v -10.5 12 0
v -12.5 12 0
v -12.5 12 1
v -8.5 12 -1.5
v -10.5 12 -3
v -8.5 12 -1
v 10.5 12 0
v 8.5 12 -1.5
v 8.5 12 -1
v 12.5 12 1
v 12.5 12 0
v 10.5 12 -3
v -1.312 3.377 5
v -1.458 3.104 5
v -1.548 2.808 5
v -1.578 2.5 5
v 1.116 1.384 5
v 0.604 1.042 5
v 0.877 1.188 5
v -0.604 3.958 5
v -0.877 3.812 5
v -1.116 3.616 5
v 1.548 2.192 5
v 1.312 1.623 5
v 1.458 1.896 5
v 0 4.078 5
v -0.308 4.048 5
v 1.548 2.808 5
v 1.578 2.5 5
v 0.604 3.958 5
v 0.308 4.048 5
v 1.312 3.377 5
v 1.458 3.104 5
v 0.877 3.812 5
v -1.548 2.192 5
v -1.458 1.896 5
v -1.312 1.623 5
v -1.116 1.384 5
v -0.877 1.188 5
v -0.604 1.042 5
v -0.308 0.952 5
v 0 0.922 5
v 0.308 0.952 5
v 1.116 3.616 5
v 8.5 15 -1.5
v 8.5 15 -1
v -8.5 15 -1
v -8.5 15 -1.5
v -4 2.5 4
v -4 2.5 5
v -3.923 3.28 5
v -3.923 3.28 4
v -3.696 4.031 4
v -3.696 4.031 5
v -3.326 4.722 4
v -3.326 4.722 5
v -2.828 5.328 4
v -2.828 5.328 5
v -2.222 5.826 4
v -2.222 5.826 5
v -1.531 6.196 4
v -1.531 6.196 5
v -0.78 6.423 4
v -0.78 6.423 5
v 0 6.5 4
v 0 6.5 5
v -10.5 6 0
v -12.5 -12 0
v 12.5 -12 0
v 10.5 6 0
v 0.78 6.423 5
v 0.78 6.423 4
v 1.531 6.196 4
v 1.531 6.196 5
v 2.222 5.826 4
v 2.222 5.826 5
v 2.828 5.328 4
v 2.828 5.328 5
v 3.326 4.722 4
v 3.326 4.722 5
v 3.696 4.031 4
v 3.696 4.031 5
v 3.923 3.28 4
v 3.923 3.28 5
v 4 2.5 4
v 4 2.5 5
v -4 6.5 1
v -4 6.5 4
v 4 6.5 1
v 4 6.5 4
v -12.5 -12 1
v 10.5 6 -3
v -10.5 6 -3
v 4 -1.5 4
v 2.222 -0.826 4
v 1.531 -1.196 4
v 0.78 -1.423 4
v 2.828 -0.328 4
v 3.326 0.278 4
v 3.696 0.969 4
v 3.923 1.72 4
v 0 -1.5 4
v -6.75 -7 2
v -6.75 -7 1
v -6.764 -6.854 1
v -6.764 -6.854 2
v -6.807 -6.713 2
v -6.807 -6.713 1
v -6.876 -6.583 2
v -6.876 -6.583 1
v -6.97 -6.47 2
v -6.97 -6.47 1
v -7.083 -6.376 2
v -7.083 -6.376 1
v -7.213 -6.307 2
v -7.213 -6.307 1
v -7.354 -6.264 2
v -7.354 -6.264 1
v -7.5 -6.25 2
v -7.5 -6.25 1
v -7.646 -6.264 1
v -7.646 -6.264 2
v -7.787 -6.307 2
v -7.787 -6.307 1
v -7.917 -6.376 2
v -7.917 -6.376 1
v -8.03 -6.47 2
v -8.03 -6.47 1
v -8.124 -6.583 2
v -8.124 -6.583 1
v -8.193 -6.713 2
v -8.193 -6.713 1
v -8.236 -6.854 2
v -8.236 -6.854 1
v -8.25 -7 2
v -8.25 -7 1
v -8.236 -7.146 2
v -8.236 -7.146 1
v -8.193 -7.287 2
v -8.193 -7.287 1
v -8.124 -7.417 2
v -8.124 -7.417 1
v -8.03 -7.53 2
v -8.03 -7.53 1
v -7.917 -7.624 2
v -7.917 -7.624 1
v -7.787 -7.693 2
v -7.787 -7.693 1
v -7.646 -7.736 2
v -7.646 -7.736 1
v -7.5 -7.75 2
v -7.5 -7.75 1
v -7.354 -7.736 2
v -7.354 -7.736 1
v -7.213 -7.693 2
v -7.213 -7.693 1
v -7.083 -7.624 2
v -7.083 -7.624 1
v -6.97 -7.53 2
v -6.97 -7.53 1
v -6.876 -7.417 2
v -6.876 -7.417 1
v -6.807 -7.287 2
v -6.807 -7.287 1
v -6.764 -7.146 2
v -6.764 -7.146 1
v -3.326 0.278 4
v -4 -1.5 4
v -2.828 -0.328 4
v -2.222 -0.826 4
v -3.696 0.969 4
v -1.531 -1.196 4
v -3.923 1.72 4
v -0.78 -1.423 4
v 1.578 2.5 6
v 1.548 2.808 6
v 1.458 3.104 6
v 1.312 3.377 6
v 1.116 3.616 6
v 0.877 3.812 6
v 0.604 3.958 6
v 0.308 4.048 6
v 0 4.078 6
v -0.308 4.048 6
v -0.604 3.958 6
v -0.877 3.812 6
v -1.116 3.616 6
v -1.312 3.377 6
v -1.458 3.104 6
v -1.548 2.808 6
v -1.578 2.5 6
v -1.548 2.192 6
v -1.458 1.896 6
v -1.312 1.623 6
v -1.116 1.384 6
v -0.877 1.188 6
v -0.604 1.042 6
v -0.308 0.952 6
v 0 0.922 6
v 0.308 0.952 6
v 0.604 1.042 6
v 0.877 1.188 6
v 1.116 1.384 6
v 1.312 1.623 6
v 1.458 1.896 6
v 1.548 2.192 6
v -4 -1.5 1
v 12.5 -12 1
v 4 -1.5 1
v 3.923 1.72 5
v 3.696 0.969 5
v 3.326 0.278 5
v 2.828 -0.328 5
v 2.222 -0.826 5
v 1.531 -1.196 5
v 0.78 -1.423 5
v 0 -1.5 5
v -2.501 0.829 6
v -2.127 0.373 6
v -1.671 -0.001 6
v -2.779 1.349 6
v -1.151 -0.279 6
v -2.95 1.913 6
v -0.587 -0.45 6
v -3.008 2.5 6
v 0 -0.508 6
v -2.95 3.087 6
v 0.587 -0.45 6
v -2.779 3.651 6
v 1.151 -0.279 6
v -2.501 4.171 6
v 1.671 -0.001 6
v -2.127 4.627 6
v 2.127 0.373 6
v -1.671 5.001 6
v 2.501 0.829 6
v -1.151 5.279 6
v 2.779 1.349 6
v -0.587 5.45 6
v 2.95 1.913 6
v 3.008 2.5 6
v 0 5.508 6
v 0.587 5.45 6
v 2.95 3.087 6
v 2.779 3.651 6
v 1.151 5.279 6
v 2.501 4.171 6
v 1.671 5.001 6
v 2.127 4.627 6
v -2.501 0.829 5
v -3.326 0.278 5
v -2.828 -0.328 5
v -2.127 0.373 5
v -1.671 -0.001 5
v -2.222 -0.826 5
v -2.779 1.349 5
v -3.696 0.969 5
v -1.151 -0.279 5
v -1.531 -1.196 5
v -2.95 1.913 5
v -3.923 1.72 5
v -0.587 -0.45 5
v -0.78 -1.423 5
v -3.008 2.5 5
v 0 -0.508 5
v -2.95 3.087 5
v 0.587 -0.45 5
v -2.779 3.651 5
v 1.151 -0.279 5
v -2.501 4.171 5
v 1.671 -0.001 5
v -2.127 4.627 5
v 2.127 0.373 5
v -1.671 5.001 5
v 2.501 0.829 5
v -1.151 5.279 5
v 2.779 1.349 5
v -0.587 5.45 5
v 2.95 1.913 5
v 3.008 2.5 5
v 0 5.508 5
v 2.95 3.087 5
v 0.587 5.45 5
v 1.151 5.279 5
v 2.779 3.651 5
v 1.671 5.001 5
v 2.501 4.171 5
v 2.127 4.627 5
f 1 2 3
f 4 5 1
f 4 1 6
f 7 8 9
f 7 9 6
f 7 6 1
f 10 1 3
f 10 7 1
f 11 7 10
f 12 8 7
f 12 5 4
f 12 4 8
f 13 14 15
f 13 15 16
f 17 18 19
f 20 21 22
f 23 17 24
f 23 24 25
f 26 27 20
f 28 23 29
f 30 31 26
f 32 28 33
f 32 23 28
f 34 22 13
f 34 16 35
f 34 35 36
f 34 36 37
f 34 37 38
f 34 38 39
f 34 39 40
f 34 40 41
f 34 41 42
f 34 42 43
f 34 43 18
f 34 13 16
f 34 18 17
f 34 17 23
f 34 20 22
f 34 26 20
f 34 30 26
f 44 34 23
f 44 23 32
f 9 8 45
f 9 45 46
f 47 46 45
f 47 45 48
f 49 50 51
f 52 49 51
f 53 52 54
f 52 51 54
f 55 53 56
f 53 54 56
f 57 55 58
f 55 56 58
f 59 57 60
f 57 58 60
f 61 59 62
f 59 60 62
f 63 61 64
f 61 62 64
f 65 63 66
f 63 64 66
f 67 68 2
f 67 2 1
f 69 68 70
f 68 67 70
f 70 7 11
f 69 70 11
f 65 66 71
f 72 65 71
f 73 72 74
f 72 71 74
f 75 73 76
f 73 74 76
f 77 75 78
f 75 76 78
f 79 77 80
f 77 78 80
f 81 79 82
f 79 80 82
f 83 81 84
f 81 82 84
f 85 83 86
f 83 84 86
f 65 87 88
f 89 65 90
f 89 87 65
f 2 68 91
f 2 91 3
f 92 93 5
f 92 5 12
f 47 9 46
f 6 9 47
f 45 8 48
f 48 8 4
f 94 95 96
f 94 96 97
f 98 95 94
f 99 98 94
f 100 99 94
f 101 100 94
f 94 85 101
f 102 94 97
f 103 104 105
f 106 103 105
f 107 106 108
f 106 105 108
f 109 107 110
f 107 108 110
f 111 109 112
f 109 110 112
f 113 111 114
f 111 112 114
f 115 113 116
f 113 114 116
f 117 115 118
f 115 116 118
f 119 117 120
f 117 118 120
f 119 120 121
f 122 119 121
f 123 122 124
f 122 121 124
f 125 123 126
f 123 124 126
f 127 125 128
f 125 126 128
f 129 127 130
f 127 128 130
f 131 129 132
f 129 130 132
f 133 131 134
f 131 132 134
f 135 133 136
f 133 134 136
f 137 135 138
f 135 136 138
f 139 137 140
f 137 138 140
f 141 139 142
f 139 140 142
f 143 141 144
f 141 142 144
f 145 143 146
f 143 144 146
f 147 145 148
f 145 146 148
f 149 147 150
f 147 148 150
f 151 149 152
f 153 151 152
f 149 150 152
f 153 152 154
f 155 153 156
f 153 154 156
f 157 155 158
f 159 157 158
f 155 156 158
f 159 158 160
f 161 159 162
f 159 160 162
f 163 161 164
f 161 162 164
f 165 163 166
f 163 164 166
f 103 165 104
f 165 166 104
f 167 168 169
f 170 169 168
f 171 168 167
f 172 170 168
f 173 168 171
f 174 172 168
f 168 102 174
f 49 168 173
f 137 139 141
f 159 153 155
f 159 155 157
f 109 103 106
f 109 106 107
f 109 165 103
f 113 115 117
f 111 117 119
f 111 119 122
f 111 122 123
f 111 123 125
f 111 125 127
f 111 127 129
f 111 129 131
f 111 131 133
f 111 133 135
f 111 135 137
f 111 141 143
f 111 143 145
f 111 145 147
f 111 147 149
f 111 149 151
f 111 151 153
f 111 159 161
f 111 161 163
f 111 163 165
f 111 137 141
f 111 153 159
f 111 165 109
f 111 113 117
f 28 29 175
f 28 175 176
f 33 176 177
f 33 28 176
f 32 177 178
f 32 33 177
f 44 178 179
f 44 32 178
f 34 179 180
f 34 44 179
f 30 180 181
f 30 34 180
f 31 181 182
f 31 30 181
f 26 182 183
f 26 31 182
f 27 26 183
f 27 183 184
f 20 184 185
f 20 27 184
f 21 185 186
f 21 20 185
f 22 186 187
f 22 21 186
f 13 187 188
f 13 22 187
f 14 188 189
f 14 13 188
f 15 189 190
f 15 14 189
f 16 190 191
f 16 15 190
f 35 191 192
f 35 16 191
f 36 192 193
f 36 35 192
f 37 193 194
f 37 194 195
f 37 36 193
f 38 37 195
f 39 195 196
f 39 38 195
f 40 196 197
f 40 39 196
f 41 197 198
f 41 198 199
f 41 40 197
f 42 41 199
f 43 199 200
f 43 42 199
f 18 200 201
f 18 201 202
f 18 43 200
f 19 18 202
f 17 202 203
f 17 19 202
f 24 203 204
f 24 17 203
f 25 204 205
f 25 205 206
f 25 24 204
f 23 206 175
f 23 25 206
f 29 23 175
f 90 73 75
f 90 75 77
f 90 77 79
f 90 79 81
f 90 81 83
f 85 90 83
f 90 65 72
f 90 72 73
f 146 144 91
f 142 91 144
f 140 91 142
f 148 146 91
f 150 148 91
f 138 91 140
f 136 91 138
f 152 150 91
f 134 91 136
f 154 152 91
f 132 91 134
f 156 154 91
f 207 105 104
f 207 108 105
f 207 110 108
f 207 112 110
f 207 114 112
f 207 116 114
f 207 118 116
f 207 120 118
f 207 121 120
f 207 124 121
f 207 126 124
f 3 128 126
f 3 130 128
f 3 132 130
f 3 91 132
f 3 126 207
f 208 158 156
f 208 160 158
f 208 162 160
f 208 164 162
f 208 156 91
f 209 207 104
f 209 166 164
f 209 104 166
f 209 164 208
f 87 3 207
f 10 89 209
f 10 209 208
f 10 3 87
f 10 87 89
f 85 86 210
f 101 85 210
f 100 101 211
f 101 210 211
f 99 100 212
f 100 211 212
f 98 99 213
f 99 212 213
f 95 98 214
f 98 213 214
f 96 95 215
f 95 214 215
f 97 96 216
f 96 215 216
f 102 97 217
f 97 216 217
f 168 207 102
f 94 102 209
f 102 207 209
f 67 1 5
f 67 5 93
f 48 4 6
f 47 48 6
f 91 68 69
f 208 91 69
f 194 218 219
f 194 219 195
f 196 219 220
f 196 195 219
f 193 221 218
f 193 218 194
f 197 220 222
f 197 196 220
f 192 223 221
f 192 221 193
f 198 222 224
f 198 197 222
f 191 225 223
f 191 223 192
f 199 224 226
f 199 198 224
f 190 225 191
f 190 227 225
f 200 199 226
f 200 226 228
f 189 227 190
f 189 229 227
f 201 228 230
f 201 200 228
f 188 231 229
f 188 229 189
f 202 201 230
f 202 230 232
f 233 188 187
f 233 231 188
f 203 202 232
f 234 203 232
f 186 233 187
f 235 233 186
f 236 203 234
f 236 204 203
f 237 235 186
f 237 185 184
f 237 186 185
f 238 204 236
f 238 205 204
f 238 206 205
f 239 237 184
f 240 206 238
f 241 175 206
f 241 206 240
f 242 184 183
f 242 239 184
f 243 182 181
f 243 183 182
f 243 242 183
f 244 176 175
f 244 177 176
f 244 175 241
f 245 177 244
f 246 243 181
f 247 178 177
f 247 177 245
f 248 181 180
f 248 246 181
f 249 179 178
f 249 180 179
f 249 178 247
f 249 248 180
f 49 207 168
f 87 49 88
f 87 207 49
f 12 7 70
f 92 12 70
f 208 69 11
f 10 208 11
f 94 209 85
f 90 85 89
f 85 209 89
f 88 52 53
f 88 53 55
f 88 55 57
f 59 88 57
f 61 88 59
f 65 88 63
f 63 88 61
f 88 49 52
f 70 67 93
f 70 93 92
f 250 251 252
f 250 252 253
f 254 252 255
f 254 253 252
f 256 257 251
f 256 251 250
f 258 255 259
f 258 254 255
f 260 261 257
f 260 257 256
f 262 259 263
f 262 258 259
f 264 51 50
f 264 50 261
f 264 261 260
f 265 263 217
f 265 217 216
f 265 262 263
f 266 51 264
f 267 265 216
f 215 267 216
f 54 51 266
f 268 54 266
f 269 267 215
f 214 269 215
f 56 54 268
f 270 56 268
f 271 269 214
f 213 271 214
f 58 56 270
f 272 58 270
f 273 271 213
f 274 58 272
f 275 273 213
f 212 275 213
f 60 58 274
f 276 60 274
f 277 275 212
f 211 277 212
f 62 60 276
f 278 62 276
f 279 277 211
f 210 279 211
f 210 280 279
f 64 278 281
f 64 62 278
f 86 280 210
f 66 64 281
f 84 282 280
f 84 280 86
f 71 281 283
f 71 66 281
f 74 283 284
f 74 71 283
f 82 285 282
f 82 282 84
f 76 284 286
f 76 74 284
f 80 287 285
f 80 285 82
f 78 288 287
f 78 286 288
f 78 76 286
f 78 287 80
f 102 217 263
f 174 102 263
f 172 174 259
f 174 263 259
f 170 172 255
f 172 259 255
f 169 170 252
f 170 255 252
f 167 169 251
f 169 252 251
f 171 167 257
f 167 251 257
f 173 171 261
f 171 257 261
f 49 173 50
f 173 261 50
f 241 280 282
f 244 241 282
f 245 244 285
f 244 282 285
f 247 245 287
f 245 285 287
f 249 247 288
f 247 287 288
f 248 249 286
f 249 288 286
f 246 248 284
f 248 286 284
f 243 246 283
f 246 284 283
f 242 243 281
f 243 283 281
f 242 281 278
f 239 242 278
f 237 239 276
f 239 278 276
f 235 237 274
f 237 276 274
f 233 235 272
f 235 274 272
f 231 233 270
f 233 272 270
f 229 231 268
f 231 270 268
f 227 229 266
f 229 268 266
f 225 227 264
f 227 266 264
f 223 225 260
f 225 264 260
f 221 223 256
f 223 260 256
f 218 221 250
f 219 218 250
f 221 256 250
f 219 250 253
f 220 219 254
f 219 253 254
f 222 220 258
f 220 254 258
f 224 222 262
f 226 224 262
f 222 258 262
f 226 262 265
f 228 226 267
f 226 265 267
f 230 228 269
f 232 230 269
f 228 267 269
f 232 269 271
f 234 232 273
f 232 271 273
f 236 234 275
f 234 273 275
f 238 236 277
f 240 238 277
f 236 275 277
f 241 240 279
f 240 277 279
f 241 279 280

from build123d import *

# Parameters (mm, degrees)
F0_W      = 25
F0_H      = 24
F1_DEPTH  = 1
F2_W      = 8
F2_H      = 8
F3_DEPTH  = 4
F5_DEPTH  = 1
F6_R      = 3.0075631212
F6_R_2    = 1.5783263093
F7_DEPTH  = 1
F8_W      = 21
F8_H      = 6
F9_DEPTH  = 3
F10_W     = 17
F10_H     = 0.5
F11_DEPTH = 3
F2_R      = 0.75
F12_DEPTH = 1


with BuildPart() as f1:
    # F0 (on Top) → F1 (new body)
    with BuildSketch(Plane.XY):
        Rectangle(F0_W, F0_H)
    extrude(amount=F1_DEPTH)

    # F2 (on face) → F3 (join)
    with BuildSketch(Plane.XY.offset(1)):
        with Locations((0, 2.5)):
            Rectangle(F2_W, F2_H)
    extrude(amount=F3_DEPTH)

    # F4 (on face) → F5 (cut)
    with BuildSketch(Plane.XY.offset(5)):
        with BuildLine():
            ThreePointArc((0, 6.5), (2.8284271247, 5.3284271247), (4, 2.5))
            Line((4, 2.5), (4, 6.5))
            Line((4, 6.5), (0, 6.5))
        make_face()
        with BuildLine():
            ThreePointArc((-4, 2.5), (-2.8284271247, 5.3284271247), (0, 6.5))
            Line((0, 6.5), (-4, 6.5))
            Line((-4, 6.5), (-4, 2.5))
        make_face()
        with BuildLine():
            Line((-4, -1.5), (0, -1.5))
            ThreePointArc((0, -1.5), (-2.8284271247, -0.3284271247), (-4, 2.5))
            Line((-4, 2.5), (-4, -1.5))
        make_face()
        with BuildLine():
            Line((4, -1.5), (4, 2.5))
            ThreePointArc((4, 2.5), (2.8284271247, -0.3284271247), (0, -1.5))
            Line((0, -1.5), (4, -1.5))
        make_face()
    extrude(amount=-F5_DEPTH, mode=Mode.SUBTRACT)

    # F6 (on face) → F7 (join)
    with BuildSketch(Plane.XY.offset(5)):
        with Locations((0, 2.5)):
            Circle(F6_R)
        with Locations((0, 2.5)):
            Circle(F6_R_2, mode=Mode.SUBTRACT)
    extrude(amount=F7_DEPTH)

    # F8 (on face) → F9 (join)
    with BuildSketch(Plane(origin=(0, 0, 0), x_dir=(1, 0, 0), z_dir=(0, 0, -1))):
        with Locations((0, -9)):
            Rectangle(F8_W, F8_H)
    extrude(amount=F9_DEPTH)

    # F10 (on face) → F11 (join)
    with BuildSketch(Plane(origin=(0, 12, 0), x_dir=(-1, 0, 0), z_dir=(0, 1, 0))):
        with Locations((0, -1.25)):
            Rectangle(F10_W, F10_H)
    extrude(amount=F11_DEPTH)

    # F2 (on face) → F12 (join)
    with BuildSketch(Plane.XY.offset(1)):
        with Locations((-7.5, -7)):
            Circle(F2_R)
    extrude(amount=F12_DEPTH)


solid = f1.part
